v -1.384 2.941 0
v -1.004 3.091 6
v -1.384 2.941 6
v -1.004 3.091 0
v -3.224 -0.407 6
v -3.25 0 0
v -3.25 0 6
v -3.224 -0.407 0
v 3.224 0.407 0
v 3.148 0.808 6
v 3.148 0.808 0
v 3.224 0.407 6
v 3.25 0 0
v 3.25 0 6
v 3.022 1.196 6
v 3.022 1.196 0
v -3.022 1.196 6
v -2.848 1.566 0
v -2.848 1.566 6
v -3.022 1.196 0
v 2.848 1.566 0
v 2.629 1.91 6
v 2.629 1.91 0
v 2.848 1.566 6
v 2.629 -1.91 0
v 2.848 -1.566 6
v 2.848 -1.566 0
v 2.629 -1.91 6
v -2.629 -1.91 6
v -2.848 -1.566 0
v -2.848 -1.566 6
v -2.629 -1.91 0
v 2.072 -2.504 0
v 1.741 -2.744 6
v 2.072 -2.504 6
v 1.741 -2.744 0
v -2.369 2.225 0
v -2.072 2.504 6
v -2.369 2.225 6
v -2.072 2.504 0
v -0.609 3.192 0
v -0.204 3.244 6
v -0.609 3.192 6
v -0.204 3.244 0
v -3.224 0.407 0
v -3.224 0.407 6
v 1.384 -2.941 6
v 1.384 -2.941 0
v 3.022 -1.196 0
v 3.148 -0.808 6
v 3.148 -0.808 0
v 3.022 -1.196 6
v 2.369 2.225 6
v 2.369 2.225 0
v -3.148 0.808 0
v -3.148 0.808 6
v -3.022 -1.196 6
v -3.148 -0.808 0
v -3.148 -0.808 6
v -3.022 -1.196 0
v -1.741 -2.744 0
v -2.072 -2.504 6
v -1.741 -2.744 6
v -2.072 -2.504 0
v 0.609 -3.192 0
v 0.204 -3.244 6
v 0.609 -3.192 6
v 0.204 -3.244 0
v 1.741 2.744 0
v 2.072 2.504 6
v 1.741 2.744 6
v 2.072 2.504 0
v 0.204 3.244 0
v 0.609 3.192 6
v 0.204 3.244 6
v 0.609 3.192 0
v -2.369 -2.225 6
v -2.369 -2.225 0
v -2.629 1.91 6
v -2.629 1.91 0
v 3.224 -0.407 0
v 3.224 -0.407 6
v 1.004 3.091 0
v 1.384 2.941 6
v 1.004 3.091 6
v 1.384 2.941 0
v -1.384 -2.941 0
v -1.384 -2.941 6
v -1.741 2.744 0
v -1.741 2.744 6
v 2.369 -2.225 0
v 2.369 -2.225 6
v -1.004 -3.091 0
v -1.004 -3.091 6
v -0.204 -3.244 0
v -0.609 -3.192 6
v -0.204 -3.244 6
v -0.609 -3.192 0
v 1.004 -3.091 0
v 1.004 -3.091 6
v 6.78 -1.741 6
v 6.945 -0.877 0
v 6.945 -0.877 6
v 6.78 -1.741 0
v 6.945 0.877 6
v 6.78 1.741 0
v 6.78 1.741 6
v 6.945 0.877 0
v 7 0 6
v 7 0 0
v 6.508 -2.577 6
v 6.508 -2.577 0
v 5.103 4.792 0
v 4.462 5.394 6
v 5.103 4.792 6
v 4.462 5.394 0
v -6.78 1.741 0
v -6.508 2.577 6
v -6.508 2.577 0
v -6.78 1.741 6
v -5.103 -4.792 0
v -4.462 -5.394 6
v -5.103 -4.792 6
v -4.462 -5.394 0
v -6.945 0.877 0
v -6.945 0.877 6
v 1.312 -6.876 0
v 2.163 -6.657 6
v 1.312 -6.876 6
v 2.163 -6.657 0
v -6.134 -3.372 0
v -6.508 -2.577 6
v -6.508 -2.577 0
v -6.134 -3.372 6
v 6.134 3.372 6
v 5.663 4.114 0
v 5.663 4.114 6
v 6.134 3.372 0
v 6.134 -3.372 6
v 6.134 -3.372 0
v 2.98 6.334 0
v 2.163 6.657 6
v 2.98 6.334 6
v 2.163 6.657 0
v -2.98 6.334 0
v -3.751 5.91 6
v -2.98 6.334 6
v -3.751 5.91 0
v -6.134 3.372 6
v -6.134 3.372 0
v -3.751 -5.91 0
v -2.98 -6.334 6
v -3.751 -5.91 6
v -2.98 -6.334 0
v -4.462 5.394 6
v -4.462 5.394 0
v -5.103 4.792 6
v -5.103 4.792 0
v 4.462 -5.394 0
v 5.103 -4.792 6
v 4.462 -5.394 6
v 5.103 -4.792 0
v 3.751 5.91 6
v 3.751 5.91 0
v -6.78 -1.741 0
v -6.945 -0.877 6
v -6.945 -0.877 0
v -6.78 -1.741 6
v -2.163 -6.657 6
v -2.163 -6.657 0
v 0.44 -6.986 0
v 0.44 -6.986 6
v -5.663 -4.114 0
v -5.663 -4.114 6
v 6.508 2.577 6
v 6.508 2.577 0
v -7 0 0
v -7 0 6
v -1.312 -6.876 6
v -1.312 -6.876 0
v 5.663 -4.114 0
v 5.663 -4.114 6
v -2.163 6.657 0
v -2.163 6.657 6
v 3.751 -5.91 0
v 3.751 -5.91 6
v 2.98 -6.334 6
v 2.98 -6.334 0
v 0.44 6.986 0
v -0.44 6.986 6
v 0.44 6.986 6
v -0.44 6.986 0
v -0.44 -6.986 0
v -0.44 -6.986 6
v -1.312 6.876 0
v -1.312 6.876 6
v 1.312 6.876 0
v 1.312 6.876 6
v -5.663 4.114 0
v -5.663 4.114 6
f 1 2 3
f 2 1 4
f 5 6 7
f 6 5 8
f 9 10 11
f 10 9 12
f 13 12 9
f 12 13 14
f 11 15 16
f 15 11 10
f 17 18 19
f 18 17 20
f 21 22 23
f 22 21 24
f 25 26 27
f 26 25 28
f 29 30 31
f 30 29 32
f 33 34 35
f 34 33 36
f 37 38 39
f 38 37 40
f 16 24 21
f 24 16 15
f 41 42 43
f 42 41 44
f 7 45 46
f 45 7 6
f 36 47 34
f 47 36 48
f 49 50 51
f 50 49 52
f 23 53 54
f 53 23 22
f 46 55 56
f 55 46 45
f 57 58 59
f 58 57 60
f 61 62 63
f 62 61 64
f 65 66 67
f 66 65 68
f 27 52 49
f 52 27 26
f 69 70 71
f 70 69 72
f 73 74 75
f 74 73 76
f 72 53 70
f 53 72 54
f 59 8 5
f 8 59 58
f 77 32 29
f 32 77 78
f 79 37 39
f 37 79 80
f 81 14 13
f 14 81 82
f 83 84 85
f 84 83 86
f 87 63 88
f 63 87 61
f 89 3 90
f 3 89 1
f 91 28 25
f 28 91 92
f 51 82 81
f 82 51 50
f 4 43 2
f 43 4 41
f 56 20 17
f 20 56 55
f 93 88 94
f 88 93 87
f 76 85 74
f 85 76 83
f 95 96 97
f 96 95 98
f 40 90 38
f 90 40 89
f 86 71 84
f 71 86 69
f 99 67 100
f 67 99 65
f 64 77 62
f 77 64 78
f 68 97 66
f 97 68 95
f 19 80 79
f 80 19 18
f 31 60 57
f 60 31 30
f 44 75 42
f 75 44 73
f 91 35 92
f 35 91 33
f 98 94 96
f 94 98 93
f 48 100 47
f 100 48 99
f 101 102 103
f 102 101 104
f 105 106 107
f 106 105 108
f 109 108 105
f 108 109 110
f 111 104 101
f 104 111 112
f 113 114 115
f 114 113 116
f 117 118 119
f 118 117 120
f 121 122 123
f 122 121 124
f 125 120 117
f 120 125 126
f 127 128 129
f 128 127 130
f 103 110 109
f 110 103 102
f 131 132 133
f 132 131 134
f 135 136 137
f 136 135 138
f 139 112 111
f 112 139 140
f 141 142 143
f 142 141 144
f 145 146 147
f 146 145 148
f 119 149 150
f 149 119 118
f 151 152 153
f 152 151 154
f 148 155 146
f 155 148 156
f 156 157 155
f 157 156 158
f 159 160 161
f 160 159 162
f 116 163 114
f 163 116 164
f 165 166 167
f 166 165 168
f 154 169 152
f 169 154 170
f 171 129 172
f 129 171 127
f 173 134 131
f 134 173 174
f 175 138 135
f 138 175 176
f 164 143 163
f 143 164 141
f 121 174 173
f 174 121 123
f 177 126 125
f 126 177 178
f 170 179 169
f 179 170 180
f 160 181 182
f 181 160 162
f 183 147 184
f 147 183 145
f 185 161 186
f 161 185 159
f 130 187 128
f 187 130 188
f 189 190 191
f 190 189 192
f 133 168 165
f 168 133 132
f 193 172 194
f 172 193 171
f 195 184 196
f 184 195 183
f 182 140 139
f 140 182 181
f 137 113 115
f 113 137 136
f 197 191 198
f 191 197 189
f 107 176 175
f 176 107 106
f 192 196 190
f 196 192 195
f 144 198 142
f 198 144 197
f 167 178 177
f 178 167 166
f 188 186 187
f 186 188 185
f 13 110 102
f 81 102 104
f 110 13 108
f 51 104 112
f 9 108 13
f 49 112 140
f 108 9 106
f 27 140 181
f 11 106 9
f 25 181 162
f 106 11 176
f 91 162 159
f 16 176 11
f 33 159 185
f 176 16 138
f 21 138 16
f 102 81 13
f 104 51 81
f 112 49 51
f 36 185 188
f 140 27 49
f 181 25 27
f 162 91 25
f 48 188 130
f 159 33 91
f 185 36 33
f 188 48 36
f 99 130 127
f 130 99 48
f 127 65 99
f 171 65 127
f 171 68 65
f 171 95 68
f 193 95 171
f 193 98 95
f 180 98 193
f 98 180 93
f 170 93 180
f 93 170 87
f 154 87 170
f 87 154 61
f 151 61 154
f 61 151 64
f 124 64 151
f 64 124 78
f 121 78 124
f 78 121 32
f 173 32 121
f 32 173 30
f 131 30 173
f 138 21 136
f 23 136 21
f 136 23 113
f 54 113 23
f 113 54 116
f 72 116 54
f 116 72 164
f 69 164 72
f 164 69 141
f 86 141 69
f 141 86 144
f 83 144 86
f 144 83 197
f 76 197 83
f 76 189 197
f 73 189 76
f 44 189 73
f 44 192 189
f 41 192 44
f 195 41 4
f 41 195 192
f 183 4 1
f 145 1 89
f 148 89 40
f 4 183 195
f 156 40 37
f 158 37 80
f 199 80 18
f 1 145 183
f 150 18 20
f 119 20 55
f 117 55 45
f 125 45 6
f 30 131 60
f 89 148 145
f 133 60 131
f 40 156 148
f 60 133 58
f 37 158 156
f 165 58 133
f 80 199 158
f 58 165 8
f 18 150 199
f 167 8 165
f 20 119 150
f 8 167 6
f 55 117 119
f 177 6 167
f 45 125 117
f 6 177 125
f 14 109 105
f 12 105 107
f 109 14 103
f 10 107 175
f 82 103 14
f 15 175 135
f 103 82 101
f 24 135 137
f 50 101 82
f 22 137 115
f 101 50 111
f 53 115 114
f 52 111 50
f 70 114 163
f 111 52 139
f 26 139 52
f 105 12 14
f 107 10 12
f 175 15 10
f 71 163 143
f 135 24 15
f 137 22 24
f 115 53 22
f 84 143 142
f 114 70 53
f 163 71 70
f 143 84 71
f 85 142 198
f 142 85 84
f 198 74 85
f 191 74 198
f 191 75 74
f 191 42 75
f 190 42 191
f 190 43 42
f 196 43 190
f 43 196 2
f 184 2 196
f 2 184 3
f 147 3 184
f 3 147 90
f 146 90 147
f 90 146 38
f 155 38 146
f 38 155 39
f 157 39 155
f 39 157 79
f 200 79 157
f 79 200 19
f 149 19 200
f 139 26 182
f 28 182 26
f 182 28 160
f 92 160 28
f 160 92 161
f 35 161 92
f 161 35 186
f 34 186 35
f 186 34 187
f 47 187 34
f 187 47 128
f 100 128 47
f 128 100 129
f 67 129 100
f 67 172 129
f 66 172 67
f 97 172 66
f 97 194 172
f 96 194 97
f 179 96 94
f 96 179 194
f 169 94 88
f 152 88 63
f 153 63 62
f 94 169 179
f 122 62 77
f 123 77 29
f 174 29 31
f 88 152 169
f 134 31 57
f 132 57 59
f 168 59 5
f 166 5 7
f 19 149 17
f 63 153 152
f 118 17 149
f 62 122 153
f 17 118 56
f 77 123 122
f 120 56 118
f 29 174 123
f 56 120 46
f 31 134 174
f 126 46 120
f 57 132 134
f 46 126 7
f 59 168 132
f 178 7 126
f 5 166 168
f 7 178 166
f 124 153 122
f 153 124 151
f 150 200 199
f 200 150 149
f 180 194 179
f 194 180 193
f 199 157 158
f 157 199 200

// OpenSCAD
$fn = 50;


difference() {
	union() {
		cylinder(h = 6, r = 7.0000000000);
	}
	union() {
		#translate(v = [0.0000000000, 0.0000000000, -100.0000000000]) {
			cylinder(h = 200, r = 3.2500000000);
		}
		#translate(v = [0.0000000000, 0.0000000000, -100.0000000000]) {
			cylinder(h = 200, r = 3.2500000000);
		}
		#translate(v = [0.0000000000, 0.0000000000, -100.0000000000]) {
			cylinder(h = 200, r = 3.2500000000);
		}
		#translate(v = [0.0000000000, 0.0000000000, -100.0000000000]) {
			cylinder(h = 200, r = 3.2500000000);
		}
		#cylinder(h = 6, r = 3.0000000000);
	}
}
